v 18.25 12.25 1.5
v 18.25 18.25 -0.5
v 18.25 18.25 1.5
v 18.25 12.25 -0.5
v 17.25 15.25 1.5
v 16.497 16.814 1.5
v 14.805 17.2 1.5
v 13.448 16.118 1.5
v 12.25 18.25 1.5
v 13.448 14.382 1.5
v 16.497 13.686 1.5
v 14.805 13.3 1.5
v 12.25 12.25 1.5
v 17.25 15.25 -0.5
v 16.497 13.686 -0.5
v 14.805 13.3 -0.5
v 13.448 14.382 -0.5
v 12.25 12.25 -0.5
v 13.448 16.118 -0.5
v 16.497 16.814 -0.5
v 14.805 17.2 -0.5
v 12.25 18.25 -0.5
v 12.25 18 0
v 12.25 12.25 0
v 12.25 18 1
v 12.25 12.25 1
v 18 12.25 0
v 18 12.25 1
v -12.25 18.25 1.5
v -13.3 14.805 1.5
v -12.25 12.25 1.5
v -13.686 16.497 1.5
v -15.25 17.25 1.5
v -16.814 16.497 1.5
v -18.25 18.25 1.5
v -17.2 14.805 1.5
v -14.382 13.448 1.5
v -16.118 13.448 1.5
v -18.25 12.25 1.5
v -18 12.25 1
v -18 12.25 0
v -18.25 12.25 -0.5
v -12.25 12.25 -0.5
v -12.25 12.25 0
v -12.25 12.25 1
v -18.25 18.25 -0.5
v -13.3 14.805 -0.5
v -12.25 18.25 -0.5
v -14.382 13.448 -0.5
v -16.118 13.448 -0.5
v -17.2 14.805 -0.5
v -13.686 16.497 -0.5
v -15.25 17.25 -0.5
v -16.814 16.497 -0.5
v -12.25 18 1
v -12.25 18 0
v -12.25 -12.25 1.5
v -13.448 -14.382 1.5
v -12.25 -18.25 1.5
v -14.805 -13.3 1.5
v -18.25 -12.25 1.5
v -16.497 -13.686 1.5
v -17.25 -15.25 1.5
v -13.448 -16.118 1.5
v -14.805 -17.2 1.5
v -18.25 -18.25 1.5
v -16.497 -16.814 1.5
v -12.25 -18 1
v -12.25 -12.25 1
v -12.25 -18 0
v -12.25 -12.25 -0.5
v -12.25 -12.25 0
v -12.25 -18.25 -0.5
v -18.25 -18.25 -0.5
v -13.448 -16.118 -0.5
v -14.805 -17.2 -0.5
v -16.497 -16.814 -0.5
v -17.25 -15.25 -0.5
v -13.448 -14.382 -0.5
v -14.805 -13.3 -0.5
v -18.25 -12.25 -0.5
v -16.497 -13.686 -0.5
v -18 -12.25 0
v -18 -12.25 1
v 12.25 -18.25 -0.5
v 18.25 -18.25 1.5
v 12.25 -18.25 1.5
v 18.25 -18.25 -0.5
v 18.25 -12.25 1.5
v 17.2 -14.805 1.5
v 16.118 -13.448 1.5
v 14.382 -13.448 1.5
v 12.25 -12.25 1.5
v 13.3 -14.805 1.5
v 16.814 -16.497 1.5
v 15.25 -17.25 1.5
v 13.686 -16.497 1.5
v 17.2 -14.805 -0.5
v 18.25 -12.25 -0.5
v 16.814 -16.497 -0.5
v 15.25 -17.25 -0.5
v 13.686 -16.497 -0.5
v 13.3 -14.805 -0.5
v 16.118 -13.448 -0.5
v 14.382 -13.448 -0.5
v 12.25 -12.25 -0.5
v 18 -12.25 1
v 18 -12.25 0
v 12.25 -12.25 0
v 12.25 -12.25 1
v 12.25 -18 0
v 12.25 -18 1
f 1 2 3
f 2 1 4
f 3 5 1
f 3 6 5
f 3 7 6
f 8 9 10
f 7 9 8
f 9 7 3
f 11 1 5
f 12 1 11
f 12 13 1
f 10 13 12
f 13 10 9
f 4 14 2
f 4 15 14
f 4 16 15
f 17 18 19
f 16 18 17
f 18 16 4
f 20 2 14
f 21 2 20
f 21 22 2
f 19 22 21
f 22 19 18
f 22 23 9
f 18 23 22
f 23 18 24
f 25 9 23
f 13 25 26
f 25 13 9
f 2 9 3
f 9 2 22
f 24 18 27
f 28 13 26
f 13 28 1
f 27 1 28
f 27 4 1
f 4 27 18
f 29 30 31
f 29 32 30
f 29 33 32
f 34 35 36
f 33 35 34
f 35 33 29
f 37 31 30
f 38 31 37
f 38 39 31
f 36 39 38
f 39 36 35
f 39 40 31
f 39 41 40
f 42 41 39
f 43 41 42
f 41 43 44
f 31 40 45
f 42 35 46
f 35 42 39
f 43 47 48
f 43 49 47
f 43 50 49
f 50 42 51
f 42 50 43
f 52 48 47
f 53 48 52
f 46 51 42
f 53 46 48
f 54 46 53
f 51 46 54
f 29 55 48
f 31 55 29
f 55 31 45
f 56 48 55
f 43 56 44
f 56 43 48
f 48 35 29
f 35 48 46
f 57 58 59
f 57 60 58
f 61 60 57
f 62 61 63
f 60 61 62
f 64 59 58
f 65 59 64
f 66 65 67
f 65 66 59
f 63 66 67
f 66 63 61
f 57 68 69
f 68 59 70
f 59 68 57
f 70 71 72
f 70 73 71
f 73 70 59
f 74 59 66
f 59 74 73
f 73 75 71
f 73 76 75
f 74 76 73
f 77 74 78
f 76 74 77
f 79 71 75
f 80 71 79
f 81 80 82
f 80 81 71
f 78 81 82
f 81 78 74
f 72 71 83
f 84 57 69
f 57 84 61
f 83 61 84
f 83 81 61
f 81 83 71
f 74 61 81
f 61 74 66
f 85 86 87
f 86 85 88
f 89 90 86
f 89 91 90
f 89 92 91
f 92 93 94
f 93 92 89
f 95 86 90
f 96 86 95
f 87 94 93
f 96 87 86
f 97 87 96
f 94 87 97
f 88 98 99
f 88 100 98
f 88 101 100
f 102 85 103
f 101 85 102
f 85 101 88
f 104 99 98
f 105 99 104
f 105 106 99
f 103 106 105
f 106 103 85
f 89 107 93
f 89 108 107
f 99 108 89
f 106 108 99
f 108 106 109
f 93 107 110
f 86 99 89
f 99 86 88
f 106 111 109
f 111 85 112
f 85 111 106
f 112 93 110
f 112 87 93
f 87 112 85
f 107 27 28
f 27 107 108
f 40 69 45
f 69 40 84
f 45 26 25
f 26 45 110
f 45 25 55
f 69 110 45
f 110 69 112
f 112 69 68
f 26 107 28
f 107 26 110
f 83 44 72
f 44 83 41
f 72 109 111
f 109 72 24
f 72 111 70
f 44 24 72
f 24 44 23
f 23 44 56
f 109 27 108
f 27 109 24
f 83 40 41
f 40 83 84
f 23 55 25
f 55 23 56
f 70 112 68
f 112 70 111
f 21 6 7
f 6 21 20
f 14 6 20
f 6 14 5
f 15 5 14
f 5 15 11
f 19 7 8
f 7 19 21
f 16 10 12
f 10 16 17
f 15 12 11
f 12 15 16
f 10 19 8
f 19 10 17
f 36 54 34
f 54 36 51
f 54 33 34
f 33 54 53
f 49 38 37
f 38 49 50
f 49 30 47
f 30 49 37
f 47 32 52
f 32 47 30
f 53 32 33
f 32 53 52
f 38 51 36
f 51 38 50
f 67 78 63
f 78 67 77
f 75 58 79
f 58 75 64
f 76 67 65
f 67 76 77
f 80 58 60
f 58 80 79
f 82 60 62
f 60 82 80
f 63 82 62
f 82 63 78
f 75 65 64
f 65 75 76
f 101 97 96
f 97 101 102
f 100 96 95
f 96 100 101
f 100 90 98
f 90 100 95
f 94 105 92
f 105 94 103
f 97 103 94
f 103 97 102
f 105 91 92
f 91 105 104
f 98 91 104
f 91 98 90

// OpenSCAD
// Plate to put in 30.5mm drone "stacks" to separate circuit boards

module aligned_cube( size, align = [ 0, 0, 0 ] )
  translate(-size/2*[[align[0],0,0],[0,align[1],0],[0,0,align[2]]])
  cube( size, center = false );

translate([0,0,0]) {
    difference() {
        union() {
            aligned_cube([36, 36, 1], [1, 1, 0]);
            for(i=[0:3]) {
            rotate(i*90)
            translate([30.5/2,30.5/2,-0.5])
            aligned_cube([6, 6, 2], [1, 1, 0]);
            }
        };
        for(i=[0:3]) {
        rotate(i*90)
        translate([30.5/2,30.5/2,-2])
        cylinder(8, r=2, fn=20);
        }
    }
}

echo(version=version());
